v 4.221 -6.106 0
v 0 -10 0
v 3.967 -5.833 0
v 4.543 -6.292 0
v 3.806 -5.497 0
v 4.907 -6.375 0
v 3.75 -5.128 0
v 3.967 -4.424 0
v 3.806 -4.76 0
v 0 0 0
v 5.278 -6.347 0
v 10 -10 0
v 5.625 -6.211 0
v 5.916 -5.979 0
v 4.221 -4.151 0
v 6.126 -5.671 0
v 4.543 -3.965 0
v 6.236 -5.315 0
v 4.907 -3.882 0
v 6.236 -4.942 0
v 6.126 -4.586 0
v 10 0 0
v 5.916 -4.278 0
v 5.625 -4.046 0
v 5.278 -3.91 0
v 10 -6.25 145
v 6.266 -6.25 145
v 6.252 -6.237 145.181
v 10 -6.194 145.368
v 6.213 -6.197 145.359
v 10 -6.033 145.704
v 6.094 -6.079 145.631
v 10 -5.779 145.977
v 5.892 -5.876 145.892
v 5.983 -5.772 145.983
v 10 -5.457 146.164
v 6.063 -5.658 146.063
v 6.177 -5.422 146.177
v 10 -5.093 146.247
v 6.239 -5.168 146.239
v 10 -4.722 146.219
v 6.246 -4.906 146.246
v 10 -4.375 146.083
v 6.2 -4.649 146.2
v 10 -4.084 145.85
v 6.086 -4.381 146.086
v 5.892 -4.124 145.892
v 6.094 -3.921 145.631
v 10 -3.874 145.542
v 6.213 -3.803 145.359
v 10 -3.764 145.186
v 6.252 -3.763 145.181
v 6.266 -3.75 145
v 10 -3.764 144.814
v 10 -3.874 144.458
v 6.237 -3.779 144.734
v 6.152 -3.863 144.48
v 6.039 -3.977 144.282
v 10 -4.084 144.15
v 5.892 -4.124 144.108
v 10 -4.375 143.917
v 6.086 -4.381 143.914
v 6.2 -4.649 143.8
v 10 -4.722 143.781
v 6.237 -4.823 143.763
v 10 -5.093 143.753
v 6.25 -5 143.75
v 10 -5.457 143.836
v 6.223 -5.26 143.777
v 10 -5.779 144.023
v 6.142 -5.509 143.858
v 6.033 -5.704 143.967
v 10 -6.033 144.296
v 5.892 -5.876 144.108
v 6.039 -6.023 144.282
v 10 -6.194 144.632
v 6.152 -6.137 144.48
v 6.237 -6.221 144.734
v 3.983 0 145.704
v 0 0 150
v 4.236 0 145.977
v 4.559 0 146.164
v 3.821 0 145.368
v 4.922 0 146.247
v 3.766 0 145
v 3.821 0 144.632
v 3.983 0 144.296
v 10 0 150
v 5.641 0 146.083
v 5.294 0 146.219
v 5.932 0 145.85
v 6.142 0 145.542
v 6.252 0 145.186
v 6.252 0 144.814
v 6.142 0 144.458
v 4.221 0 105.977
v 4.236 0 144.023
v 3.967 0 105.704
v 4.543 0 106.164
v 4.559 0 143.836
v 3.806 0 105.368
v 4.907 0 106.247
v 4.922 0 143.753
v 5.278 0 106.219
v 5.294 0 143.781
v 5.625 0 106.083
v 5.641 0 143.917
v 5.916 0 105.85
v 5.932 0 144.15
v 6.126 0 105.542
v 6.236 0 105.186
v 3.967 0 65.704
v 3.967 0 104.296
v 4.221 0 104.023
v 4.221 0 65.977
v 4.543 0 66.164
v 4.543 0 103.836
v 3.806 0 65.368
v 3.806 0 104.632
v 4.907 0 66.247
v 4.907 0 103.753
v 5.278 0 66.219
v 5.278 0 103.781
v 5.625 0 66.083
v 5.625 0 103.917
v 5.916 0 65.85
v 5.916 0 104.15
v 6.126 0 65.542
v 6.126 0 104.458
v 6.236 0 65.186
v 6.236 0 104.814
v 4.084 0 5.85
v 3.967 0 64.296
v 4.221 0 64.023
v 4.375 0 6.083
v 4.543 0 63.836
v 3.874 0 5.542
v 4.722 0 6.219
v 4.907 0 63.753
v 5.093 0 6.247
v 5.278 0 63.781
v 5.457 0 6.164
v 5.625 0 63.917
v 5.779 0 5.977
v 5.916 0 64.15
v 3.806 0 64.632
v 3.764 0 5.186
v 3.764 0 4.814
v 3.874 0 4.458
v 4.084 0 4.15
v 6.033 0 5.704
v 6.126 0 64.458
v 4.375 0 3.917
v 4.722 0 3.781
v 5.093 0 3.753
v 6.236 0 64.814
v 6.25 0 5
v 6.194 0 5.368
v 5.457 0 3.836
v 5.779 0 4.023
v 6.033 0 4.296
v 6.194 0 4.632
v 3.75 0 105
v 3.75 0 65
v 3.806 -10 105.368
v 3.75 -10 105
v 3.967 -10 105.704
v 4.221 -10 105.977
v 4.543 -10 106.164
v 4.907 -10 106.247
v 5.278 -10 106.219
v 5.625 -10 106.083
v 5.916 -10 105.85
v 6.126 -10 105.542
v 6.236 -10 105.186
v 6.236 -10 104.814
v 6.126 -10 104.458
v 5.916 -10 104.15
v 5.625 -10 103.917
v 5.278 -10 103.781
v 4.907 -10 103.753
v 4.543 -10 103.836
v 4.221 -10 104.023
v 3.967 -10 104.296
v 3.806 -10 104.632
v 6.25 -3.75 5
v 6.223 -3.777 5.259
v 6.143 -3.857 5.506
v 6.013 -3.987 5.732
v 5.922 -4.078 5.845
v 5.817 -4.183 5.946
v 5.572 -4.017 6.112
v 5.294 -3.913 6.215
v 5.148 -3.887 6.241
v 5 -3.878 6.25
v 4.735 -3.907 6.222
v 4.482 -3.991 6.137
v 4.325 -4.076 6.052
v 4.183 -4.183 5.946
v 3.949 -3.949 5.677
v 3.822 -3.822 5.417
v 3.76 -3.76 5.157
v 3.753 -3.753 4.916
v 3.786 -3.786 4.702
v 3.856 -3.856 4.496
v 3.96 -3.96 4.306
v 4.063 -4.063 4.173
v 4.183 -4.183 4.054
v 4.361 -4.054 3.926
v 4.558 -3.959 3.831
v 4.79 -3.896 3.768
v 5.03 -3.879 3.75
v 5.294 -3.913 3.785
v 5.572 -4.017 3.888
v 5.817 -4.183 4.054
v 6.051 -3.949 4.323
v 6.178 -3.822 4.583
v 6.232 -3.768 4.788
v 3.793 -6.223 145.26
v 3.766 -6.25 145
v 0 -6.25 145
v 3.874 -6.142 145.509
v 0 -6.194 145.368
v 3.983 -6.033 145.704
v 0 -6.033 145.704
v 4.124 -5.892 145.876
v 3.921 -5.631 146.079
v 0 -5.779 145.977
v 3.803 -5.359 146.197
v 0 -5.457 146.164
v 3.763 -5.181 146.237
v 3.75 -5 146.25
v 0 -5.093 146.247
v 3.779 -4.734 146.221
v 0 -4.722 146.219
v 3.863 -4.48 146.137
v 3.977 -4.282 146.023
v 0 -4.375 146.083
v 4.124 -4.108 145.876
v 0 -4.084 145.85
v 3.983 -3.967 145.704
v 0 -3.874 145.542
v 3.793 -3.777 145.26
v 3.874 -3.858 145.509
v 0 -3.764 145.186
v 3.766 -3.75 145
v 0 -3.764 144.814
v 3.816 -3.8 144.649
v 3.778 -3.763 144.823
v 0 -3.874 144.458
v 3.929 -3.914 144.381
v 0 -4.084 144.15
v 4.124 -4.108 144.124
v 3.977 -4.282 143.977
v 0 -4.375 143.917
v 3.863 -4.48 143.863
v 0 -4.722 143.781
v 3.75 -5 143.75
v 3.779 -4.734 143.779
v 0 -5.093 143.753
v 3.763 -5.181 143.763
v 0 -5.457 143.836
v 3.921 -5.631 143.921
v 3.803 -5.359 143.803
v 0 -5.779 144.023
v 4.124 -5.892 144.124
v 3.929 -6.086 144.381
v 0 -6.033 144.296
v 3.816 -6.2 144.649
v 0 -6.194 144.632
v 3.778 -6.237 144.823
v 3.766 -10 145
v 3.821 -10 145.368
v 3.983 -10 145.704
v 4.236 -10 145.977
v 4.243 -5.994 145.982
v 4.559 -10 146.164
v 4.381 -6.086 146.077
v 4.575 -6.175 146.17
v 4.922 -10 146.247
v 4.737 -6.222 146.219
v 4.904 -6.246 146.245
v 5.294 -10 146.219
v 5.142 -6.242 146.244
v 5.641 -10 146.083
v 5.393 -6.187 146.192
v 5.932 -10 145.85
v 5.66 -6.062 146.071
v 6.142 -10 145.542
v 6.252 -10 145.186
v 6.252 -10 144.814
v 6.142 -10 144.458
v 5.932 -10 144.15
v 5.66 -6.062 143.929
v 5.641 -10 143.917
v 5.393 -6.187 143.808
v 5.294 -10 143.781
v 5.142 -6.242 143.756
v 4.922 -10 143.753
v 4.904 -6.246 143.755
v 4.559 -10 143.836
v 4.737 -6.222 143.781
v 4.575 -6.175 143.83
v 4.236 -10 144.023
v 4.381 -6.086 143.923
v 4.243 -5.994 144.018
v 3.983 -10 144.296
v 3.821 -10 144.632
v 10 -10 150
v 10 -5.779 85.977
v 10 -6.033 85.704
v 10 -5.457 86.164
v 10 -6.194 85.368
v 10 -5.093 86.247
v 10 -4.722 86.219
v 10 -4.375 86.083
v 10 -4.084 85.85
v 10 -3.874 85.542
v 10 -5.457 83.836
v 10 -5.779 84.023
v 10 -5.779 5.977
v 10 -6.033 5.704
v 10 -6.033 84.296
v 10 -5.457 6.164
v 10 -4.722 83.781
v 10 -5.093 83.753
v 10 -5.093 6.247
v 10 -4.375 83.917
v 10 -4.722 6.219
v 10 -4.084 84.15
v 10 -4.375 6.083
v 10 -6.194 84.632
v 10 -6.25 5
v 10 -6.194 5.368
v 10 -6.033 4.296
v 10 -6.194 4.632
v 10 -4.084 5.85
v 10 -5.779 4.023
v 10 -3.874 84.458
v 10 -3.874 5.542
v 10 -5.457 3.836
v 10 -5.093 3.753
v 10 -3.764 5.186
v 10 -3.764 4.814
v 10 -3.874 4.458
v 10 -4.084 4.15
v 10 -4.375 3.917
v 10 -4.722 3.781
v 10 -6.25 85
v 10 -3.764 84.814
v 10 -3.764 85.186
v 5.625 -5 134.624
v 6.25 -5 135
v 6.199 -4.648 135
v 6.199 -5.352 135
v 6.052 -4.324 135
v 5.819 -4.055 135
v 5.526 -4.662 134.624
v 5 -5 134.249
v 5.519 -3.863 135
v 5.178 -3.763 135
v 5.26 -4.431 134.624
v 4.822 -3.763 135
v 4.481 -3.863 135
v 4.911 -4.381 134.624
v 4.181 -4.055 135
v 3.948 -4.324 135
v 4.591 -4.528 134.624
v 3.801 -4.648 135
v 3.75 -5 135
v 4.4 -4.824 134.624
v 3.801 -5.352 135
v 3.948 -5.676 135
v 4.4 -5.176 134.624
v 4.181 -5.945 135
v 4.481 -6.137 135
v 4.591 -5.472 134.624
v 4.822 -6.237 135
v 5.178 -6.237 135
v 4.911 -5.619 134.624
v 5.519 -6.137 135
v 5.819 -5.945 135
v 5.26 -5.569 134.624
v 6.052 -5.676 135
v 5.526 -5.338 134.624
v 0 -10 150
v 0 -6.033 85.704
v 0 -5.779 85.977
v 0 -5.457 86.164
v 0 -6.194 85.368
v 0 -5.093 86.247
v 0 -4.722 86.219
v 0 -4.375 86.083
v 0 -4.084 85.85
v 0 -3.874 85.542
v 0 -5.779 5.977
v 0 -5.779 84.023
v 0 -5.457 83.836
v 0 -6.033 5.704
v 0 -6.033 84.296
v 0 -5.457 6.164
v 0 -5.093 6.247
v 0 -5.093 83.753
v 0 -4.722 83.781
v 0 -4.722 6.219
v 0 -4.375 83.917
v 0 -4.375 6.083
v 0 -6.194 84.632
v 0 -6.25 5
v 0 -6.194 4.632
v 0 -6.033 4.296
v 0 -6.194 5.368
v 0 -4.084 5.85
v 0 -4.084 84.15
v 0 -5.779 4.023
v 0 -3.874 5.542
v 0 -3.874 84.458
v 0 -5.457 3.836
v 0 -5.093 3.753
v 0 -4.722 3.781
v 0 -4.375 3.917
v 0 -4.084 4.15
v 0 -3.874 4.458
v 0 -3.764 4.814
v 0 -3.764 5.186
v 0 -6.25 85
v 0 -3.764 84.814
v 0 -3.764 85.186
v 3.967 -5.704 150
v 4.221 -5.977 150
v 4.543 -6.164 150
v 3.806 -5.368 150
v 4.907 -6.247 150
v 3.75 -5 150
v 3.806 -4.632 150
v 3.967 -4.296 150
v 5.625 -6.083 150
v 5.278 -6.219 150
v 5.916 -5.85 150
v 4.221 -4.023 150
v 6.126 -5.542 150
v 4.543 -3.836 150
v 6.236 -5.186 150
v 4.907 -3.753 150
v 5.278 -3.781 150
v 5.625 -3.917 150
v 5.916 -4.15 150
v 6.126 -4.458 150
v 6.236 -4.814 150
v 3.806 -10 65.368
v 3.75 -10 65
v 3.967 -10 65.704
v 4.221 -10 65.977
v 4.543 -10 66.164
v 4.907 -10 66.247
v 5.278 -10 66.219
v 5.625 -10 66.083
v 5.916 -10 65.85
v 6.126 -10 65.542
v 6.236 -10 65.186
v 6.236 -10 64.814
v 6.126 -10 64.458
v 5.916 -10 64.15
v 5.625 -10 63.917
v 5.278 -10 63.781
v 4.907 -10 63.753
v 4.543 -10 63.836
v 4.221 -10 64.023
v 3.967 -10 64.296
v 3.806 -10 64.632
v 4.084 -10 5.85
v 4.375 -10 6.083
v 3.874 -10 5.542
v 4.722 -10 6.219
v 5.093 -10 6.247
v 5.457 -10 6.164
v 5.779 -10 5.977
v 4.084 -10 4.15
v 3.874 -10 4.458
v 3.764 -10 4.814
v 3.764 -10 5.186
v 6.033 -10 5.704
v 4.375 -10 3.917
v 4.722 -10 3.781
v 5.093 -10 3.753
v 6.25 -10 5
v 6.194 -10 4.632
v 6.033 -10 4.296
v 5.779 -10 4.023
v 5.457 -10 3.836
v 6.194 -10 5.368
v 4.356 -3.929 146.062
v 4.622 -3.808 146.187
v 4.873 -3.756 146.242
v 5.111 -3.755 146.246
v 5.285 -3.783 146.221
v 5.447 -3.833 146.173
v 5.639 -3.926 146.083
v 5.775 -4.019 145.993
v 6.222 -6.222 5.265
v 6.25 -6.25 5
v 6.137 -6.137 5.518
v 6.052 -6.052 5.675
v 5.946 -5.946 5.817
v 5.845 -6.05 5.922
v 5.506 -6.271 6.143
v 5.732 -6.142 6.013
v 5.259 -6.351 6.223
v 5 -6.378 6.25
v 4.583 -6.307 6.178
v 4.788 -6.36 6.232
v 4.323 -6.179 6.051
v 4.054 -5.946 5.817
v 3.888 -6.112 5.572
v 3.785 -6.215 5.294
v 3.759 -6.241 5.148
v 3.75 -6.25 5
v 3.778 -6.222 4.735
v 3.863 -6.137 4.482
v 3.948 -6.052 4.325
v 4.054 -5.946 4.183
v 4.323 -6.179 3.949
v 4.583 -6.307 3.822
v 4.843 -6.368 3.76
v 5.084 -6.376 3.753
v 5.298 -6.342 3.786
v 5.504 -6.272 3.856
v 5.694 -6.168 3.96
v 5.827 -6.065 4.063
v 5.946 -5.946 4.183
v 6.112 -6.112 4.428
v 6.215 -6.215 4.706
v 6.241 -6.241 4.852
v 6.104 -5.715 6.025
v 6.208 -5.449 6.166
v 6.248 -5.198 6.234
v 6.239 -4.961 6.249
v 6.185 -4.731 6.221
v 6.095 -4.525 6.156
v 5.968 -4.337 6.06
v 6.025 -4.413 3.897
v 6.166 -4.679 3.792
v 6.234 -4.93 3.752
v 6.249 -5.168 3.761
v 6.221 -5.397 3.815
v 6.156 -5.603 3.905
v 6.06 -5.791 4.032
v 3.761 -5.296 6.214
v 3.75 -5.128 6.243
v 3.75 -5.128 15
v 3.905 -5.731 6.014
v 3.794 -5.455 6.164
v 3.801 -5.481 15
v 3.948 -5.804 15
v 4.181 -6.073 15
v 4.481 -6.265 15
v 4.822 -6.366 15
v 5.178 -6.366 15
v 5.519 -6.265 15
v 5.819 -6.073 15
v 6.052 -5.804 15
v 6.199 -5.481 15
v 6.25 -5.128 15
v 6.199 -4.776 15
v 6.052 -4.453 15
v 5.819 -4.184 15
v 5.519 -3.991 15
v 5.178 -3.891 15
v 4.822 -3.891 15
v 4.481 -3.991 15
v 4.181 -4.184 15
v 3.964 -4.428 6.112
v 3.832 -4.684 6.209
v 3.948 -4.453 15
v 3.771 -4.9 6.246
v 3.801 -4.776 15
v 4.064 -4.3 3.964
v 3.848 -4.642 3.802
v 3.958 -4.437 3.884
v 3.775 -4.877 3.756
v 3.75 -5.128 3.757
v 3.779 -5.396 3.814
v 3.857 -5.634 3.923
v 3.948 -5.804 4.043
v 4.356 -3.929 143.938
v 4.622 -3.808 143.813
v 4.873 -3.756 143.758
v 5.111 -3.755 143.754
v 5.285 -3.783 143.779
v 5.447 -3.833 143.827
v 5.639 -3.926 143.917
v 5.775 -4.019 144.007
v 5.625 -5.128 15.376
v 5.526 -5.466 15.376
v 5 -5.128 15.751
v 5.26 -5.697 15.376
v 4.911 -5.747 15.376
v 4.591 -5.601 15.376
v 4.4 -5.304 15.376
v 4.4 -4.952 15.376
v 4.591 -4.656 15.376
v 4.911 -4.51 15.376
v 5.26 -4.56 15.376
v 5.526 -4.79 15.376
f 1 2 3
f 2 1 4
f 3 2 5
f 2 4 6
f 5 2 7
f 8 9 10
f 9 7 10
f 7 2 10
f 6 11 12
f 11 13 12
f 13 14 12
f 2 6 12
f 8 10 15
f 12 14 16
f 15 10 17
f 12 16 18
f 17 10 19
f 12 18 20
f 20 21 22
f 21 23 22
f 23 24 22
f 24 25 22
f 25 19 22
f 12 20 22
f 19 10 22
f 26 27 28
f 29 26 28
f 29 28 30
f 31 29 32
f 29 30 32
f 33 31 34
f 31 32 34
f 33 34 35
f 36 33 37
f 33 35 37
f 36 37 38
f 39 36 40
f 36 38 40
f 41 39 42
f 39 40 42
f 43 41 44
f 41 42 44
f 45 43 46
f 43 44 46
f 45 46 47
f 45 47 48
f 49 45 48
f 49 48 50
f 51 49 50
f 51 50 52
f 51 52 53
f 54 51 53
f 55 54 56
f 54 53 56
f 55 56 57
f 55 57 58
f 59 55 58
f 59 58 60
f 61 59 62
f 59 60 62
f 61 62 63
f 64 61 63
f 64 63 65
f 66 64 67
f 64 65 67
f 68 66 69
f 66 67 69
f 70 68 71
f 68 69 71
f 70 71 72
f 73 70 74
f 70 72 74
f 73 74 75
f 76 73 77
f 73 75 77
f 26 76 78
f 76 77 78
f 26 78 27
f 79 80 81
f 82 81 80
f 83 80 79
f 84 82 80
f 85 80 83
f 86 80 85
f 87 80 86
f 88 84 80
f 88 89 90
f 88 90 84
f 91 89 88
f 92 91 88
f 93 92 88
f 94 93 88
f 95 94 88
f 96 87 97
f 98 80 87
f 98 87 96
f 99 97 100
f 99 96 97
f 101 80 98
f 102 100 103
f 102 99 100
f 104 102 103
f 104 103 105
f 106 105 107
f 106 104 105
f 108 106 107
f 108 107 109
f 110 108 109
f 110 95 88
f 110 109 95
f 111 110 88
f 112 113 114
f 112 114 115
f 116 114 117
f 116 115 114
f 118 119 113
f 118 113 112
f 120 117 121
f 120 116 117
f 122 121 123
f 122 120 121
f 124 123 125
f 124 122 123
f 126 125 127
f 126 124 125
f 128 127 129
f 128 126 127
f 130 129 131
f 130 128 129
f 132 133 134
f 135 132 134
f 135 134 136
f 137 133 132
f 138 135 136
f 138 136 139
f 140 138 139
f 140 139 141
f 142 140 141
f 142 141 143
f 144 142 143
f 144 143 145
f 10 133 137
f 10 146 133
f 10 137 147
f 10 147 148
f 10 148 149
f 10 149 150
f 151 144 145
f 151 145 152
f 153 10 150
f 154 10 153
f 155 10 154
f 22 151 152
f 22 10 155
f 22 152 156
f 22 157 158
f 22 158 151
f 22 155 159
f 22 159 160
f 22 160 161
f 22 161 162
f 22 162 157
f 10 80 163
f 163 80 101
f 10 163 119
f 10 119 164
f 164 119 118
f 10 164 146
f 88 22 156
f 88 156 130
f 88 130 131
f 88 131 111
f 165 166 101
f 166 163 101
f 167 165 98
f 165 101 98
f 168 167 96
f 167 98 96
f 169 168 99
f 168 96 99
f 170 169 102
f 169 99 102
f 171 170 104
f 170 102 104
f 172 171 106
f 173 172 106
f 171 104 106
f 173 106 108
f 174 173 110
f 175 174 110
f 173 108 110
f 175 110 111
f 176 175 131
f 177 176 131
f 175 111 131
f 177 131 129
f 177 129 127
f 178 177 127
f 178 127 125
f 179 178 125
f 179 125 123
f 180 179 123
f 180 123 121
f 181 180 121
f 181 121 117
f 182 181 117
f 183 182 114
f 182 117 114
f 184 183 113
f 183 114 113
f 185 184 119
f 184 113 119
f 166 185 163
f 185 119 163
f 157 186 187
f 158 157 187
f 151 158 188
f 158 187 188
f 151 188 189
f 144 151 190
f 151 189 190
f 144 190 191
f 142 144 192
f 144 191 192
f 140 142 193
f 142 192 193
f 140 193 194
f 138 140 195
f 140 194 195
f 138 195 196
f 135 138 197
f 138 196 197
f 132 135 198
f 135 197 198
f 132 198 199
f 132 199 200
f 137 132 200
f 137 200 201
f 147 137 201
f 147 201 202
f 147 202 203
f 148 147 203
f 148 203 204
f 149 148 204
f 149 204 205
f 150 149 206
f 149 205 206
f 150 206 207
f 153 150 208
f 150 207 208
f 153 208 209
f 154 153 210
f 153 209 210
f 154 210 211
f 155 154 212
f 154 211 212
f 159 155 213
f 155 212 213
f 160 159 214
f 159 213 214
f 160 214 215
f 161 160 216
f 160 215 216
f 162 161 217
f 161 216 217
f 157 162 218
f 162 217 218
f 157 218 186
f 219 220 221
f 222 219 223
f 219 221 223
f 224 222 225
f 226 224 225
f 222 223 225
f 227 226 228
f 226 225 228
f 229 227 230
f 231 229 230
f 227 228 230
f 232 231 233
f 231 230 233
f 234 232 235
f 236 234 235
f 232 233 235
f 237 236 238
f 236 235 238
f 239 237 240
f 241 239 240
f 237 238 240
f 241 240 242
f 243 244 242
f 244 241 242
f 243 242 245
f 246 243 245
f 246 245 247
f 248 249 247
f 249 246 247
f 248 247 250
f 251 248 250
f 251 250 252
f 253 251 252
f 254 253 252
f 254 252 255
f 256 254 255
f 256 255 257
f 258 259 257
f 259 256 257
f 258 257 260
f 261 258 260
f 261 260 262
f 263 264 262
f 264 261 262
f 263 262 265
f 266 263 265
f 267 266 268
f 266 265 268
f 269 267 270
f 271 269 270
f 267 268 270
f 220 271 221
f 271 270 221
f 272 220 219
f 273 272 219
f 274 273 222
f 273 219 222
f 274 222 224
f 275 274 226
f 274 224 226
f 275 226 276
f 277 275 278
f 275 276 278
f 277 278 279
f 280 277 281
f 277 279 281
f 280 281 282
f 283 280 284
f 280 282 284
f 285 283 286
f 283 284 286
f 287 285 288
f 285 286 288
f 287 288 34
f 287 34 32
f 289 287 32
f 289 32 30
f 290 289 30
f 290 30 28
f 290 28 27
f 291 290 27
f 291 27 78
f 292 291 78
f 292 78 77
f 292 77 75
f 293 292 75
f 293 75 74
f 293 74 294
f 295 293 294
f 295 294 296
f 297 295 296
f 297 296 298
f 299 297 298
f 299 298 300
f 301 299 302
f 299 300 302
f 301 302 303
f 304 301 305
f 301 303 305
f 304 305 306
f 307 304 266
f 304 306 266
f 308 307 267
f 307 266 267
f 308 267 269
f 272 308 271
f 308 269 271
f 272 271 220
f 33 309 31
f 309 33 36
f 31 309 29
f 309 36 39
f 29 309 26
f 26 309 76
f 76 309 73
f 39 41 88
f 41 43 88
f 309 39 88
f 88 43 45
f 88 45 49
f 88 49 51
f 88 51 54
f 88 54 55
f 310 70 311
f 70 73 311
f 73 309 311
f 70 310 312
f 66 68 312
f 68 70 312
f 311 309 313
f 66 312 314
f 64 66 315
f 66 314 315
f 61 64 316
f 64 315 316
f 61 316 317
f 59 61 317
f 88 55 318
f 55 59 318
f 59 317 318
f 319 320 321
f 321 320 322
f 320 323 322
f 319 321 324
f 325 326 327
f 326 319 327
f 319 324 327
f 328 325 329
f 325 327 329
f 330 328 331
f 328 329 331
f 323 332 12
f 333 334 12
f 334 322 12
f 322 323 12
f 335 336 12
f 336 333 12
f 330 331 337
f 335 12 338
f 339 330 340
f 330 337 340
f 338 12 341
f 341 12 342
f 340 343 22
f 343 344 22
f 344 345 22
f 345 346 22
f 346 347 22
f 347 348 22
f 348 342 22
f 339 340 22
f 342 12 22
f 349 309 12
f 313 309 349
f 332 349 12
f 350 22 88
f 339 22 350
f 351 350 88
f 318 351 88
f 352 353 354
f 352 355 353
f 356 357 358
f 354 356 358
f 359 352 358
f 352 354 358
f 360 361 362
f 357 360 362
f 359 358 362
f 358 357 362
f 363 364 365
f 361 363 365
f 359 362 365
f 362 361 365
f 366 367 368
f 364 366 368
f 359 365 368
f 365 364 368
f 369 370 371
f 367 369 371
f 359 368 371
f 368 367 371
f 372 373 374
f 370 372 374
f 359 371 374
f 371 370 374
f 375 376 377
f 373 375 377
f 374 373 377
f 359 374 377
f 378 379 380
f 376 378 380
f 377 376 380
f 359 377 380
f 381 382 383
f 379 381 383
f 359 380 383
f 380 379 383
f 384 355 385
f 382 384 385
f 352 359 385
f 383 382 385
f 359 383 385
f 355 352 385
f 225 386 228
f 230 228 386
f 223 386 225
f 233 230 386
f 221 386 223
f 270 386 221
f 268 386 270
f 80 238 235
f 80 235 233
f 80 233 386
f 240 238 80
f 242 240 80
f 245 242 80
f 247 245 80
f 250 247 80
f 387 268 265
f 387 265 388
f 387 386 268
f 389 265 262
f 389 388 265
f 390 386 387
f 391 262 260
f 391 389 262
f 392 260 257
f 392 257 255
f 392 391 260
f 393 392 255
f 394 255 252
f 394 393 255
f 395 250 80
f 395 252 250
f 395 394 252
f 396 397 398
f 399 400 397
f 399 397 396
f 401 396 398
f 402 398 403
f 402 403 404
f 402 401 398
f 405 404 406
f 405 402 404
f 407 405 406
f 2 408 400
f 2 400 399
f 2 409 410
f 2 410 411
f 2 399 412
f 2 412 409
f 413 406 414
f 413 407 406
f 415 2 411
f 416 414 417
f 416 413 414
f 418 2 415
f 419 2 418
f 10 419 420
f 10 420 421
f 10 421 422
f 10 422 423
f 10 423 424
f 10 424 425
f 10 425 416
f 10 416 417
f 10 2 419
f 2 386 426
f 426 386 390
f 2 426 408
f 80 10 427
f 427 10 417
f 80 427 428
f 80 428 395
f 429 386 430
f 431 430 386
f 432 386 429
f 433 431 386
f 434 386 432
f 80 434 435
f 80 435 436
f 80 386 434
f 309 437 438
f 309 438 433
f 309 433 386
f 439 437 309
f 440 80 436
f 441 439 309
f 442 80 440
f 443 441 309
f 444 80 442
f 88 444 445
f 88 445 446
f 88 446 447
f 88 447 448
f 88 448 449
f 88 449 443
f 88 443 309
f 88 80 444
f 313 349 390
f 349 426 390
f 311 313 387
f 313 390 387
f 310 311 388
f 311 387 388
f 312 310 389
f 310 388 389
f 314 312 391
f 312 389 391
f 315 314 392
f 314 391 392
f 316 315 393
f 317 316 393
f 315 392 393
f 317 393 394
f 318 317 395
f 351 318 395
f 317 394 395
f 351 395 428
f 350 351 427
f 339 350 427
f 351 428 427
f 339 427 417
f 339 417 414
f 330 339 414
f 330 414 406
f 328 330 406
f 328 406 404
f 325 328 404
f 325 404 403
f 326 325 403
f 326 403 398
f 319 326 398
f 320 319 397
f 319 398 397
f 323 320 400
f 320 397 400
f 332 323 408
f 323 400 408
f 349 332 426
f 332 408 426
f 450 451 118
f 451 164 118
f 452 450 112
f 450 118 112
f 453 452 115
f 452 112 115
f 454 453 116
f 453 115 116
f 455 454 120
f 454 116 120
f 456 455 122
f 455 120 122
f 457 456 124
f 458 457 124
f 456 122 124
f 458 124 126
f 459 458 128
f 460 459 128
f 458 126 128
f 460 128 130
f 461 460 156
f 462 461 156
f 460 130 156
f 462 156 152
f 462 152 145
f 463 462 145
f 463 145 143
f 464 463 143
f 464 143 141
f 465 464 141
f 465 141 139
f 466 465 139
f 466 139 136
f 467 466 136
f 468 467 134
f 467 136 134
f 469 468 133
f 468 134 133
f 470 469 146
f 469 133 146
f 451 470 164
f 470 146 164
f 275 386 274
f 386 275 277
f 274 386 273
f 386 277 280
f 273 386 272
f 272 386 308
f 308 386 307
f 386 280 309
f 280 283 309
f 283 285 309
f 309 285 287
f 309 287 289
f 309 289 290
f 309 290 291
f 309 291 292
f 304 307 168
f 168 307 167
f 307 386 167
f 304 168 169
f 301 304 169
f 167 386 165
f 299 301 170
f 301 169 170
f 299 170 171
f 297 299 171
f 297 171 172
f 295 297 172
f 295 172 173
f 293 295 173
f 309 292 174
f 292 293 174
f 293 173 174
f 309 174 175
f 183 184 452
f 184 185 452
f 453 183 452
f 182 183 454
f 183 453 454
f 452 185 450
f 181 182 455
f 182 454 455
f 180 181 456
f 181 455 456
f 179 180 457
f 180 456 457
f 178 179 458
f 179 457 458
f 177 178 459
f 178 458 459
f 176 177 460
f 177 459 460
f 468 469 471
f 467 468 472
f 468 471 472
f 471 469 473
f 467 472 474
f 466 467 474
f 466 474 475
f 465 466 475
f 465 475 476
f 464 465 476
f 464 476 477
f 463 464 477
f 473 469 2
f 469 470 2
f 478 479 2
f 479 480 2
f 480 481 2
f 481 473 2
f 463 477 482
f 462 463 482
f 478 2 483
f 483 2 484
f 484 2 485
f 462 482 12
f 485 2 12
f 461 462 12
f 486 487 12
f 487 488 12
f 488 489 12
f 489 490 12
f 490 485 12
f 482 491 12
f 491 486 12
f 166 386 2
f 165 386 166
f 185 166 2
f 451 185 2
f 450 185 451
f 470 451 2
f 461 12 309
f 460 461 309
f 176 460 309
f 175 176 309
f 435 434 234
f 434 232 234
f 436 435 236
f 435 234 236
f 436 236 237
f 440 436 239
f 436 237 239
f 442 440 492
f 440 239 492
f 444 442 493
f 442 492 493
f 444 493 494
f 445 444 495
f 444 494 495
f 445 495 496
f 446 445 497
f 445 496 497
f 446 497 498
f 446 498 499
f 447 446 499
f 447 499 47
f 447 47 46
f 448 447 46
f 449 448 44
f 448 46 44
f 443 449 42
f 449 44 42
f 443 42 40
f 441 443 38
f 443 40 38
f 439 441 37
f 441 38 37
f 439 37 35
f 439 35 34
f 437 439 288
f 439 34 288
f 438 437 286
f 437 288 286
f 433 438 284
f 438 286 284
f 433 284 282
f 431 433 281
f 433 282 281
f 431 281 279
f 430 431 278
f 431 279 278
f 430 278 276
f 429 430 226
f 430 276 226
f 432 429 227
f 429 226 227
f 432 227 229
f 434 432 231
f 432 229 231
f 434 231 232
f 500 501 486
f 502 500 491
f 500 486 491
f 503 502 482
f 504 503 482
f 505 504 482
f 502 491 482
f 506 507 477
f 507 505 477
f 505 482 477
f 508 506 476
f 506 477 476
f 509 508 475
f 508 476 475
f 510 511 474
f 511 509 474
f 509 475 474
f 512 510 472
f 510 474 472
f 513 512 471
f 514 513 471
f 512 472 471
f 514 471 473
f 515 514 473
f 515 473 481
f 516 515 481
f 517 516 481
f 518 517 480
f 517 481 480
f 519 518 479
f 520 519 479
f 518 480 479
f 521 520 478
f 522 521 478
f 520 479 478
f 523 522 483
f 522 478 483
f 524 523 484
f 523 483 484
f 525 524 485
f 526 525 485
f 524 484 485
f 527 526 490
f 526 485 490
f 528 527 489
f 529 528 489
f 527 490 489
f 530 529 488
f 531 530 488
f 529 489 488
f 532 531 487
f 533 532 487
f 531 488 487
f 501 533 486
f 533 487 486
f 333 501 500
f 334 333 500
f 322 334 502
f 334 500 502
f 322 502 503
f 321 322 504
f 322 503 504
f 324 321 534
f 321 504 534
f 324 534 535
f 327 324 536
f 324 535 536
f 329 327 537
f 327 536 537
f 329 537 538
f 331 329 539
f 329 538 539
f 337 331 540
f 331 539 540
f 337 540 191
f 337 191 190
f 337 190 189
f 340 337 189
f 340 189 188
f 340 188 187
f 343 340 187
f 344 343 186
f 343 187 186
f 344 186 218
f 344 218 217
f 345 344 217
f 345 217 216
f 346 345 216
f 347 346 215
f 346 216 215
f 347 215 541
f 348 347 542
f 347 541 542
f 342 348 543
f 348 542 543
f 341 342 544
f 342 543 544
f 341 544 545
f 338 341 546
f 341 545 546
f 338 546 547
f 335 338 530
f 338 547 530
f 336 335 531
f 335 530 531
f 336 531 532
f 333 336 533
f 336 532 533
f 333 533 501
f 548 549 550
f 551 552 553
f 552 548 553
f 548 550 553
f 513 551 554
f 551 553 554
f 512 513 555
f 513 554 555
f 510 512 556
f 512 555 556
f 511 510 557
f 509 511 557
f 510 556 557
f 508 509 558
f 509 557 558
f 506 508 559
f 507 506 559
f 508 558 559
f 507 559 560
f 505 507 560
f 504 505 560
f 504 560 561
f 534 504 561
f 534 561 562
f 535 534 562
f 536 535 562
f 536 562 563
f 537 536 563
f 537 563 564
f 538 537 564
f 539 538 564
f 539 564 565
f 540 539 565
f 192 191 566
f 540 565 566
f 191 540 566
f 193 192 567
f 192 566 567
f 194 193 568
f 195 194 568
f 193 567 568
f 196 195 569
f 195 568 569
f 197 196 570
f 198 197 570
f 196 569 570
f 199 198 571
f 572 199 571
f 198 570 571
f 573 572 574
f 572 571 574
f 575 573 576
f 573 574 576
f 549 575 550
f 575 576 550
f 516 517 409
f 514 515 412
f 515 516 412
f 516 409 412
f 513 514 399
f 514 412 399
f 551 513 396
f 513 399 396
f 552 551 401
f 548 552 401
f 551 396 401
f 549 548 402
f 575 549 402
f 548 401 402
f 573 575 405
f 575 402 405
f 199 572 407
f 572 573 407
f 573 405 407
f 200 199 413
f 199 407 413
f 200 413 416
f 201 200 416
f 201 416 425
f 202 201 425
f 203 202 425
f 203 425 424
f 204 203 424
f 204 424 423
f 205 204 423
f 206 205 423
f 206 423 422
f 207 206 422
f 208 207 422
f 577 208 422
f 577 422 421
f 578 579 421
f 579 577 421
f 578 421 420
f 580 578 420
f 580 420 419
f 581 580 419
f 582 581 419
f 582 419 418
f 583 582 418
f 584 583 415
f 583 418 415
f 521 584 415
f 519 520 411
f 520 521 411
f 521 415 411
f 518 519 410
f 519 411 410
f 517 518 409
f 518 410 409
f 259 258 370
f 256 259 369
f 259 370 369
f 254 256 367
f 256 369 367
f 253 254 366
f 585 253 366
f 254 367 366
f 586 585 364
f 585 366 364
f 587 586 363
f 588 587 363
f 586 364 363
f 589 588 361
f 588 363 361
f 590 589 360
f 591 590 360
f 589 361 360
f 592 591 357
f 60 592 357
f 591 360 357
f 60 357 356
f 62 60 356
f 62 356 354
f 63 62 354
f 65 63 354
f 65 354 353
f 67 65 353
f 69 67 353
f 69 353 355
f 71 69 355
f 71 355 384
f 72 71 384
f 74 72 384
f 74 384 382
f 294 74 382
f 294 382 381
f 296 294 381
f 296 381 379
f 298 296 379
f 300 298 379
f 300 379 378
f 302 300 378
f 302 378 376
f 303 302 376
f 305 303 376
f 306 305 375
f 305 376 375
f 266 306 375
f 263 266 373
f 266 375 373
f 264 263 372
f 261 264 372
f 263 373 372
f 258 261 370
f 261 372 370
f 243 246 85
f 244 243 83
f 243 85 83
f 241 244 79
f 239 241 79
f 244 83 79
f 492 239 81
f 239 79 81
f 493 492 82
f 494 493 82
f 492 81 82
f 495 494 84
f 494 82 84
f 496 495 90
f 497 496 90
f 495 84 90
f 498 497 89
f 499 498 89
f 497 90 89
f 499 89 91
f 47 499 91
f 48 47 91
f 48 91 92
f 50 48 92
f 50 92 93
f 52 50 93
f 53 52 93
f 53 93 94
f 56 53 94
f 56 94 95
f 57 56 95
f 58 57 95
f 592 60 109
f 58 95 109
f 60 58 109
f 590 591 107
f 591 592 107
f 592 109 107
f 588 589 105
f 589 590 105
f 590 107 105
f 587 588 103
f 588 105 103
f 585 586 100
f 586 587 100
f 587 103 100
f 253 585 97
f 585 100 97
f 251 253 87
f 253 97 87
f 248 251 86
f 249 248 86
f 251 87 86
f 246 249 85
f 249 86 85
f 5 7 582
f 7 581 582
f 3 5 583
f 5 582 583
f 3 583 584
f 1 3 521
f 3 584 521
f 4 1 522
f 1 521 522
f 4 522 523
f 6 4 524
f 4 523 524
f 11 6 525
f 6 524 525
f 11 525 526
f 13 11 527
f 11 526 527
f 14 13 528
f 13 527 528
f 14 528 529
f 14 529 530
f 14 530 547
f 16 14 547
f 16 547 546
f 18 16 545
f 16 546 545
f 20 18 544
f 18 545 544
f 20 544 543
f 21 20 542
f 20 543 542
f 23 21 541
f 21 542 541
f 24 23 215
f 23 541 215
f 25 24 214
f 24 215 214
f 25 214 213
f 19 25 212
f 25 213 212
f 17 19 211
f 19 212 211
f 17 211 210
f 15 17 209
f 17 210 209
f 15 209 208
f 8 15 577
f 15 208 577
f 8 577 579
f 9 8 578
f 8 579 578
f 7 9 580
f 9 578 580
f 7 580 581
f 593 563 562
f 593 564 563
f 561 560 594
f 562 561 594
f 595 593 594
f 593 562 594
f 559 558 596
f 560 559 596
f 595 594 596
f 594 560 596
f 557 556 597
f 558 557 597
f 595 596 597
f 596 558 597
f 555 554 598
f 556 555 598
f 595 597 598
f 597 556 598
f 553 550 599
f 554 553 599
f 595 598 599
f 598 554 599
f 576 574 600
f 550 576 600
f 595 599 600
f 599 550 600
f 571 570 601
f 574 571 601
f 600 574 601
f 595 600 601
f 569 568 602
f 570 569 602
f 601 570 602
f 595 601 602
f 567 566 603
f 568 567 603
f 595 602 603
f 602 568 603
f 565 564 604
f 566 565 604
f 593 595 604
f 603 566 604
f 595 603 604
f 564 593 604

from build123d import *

# Parameters (mm, degrees)
F0_W      = 10
F0_H      = 10
F1_DEPTH  = 150
F3_D      = 2.5
F3_DEPTH  = 15
F3_TIP    = 0.7510757738
F5_D      = 2.5
F5_DEPTH  = 15
F5_TIP    = 0.7510757738
F7_D      = 2.5
F7_DEPTH  = 10
F7_TIP    = 0.7510757738
F9_D      = 2.5
F9_DEPTH  = 10
F9_TIP    = 0.7510757738
F11_D     = 2.5
F11_DEPTH = 10
F11_TIP   = 0.7510757738
F13_D     = 2.5
F13_DEPTH = 10
F13_TIP   = 0.7510757738
F15_D     = 2.5
F15_DEPTH = 10
F15_TIP   = 0.7510757738
F17_D     = 2.5
F17_DEPTH = 10
F17_TIP   = 0.7510757738
F19_D     = 2.5
F19_DEPTH = 10
F19_TIP   = 0.7510757738


with BuildPart() as f1:
    # F0 (on Top) → F1 (new body)
    with BuildSketch(Plane.XY):
        with Locations((5, -5)):
            Rectangle(F0_W, F0_H)
    extrude(amount=F1_DEPTH)

    # F3
    with Locations(Plane.XY.offset(150)):
        with Locations((5, -5)):
            Hole(F3_D / 2, depth=F3_DEPTH)
            with Locations((0, 0, -(F3_DEPTH + F3_TIP / 2))):  # 118° drill point
                Cone(0, F3_D / 2, F3_TIP, mode=Mode.SUBTRACT)

    # F5
    with Locations(Plane(origin=(0, 0, 0), x_dir=(1, 0, 0), z_dir=(0, 0, -1))):
        with Locations((5, 5.128350097)):
            Hole(F5_D / 2, depth=F5_DEPTH)
            with Locations((0, 0, -(F5_DEPTH + F5_TIP / 2))):  # 118° drill point
                Cone(0, F5_D / 2, F5_TIP, mode=Mode.SUBTRACT)

    # F7
    with Locations(Plane(origin=(0, 0, 0), x_dir=(-1, 0, 0), z_dir=(0, 1, 0))):
        with Locations((-5, 5)):
            Hole(F7_D / 2, depth=F7_DEPTH)
            with Locations((0, 0, -(F7_DEPTH + F7_TIP / 2))):  # 118° drill point
                Cone(0, F7_D / 2, F7_TIP, mode=Mode.SUBTRACT)

    # F9
    with Locations(Plane.XZ.offset(10)):
        with Locations((5.0156186335, 145)):
            Hole(F9_D / 2, depth=F9_DEPTH)
            with Locations((0, 0, -(F9_DEPTH + F9_TIP / 2))):  # 118° drill point
                Cone(0, F9_D / 2, F9_TIP, mode=Mode.SUBTRACT)

    # F11
    with Locations(Plane.XZ.offset(10)):
        with Locations((5, 65)):
            Hole(F11_D / 2, depth=F11_DEPTH)
            with Locations((0, 0, -(F11_DEPTH + F11_TIP / 2))):  # 118° drill point
                Cone(0, F11_D / 2, F11_TIP, mode=Mode.SUBTRACT)

    # F13
    with Locations(Plane.XZ.offset(10)):
        with Locations((5, 105)):
            Hole(F13_D / 2, depth=F13_DEPTH)
            with Locations((0, 0, -(F13_DEPTH + F13_TIP / 2))):  # 118° drill point
                Cone(0, F13_D / 2, F13_TIP, mode=Mode.SUBTRACT)

    # F15
    with Locations(Plane.YZ.offset(10)):
        with Locations((-5, 145)):
            Hole(F15_D / 2, depth=F15_DEPTH)
            with Locations((0, 0, -(F15_DEPTH + F15_TIP / 2))):  # 118° drill point
                Cone(0, F15_D / 2, F15_TIP, mode=Mode.SUBTRACT)

    # F17
    with Locations(Plane.YZ.offset(10)):
        with Locations((-5, 5)):
            Hole(F17_D / 2, depth=F17_DEPTH)
            with Locations((0, 0, -(F17_DEPTH + F17_TIP / 2))):  # 118° drill point
                Cone(0, F17_D / 2, F17_TIP, mode=Mode.SUBTRACT)

    # F19
    with Locations(Plane.YZ.offset(10)):
        with Locations((-5, 85)):
            Hole(F19_D / 2, depth=F19_DEPTH)
            with Locations((0, 0, -(F19_DEPTH + F19_TIP / 2))):  # 118° drill point
                Cone(0, F19_D / 2, F19_TIP, mode=Mode.SUBTRACT)


solid = f1.part
